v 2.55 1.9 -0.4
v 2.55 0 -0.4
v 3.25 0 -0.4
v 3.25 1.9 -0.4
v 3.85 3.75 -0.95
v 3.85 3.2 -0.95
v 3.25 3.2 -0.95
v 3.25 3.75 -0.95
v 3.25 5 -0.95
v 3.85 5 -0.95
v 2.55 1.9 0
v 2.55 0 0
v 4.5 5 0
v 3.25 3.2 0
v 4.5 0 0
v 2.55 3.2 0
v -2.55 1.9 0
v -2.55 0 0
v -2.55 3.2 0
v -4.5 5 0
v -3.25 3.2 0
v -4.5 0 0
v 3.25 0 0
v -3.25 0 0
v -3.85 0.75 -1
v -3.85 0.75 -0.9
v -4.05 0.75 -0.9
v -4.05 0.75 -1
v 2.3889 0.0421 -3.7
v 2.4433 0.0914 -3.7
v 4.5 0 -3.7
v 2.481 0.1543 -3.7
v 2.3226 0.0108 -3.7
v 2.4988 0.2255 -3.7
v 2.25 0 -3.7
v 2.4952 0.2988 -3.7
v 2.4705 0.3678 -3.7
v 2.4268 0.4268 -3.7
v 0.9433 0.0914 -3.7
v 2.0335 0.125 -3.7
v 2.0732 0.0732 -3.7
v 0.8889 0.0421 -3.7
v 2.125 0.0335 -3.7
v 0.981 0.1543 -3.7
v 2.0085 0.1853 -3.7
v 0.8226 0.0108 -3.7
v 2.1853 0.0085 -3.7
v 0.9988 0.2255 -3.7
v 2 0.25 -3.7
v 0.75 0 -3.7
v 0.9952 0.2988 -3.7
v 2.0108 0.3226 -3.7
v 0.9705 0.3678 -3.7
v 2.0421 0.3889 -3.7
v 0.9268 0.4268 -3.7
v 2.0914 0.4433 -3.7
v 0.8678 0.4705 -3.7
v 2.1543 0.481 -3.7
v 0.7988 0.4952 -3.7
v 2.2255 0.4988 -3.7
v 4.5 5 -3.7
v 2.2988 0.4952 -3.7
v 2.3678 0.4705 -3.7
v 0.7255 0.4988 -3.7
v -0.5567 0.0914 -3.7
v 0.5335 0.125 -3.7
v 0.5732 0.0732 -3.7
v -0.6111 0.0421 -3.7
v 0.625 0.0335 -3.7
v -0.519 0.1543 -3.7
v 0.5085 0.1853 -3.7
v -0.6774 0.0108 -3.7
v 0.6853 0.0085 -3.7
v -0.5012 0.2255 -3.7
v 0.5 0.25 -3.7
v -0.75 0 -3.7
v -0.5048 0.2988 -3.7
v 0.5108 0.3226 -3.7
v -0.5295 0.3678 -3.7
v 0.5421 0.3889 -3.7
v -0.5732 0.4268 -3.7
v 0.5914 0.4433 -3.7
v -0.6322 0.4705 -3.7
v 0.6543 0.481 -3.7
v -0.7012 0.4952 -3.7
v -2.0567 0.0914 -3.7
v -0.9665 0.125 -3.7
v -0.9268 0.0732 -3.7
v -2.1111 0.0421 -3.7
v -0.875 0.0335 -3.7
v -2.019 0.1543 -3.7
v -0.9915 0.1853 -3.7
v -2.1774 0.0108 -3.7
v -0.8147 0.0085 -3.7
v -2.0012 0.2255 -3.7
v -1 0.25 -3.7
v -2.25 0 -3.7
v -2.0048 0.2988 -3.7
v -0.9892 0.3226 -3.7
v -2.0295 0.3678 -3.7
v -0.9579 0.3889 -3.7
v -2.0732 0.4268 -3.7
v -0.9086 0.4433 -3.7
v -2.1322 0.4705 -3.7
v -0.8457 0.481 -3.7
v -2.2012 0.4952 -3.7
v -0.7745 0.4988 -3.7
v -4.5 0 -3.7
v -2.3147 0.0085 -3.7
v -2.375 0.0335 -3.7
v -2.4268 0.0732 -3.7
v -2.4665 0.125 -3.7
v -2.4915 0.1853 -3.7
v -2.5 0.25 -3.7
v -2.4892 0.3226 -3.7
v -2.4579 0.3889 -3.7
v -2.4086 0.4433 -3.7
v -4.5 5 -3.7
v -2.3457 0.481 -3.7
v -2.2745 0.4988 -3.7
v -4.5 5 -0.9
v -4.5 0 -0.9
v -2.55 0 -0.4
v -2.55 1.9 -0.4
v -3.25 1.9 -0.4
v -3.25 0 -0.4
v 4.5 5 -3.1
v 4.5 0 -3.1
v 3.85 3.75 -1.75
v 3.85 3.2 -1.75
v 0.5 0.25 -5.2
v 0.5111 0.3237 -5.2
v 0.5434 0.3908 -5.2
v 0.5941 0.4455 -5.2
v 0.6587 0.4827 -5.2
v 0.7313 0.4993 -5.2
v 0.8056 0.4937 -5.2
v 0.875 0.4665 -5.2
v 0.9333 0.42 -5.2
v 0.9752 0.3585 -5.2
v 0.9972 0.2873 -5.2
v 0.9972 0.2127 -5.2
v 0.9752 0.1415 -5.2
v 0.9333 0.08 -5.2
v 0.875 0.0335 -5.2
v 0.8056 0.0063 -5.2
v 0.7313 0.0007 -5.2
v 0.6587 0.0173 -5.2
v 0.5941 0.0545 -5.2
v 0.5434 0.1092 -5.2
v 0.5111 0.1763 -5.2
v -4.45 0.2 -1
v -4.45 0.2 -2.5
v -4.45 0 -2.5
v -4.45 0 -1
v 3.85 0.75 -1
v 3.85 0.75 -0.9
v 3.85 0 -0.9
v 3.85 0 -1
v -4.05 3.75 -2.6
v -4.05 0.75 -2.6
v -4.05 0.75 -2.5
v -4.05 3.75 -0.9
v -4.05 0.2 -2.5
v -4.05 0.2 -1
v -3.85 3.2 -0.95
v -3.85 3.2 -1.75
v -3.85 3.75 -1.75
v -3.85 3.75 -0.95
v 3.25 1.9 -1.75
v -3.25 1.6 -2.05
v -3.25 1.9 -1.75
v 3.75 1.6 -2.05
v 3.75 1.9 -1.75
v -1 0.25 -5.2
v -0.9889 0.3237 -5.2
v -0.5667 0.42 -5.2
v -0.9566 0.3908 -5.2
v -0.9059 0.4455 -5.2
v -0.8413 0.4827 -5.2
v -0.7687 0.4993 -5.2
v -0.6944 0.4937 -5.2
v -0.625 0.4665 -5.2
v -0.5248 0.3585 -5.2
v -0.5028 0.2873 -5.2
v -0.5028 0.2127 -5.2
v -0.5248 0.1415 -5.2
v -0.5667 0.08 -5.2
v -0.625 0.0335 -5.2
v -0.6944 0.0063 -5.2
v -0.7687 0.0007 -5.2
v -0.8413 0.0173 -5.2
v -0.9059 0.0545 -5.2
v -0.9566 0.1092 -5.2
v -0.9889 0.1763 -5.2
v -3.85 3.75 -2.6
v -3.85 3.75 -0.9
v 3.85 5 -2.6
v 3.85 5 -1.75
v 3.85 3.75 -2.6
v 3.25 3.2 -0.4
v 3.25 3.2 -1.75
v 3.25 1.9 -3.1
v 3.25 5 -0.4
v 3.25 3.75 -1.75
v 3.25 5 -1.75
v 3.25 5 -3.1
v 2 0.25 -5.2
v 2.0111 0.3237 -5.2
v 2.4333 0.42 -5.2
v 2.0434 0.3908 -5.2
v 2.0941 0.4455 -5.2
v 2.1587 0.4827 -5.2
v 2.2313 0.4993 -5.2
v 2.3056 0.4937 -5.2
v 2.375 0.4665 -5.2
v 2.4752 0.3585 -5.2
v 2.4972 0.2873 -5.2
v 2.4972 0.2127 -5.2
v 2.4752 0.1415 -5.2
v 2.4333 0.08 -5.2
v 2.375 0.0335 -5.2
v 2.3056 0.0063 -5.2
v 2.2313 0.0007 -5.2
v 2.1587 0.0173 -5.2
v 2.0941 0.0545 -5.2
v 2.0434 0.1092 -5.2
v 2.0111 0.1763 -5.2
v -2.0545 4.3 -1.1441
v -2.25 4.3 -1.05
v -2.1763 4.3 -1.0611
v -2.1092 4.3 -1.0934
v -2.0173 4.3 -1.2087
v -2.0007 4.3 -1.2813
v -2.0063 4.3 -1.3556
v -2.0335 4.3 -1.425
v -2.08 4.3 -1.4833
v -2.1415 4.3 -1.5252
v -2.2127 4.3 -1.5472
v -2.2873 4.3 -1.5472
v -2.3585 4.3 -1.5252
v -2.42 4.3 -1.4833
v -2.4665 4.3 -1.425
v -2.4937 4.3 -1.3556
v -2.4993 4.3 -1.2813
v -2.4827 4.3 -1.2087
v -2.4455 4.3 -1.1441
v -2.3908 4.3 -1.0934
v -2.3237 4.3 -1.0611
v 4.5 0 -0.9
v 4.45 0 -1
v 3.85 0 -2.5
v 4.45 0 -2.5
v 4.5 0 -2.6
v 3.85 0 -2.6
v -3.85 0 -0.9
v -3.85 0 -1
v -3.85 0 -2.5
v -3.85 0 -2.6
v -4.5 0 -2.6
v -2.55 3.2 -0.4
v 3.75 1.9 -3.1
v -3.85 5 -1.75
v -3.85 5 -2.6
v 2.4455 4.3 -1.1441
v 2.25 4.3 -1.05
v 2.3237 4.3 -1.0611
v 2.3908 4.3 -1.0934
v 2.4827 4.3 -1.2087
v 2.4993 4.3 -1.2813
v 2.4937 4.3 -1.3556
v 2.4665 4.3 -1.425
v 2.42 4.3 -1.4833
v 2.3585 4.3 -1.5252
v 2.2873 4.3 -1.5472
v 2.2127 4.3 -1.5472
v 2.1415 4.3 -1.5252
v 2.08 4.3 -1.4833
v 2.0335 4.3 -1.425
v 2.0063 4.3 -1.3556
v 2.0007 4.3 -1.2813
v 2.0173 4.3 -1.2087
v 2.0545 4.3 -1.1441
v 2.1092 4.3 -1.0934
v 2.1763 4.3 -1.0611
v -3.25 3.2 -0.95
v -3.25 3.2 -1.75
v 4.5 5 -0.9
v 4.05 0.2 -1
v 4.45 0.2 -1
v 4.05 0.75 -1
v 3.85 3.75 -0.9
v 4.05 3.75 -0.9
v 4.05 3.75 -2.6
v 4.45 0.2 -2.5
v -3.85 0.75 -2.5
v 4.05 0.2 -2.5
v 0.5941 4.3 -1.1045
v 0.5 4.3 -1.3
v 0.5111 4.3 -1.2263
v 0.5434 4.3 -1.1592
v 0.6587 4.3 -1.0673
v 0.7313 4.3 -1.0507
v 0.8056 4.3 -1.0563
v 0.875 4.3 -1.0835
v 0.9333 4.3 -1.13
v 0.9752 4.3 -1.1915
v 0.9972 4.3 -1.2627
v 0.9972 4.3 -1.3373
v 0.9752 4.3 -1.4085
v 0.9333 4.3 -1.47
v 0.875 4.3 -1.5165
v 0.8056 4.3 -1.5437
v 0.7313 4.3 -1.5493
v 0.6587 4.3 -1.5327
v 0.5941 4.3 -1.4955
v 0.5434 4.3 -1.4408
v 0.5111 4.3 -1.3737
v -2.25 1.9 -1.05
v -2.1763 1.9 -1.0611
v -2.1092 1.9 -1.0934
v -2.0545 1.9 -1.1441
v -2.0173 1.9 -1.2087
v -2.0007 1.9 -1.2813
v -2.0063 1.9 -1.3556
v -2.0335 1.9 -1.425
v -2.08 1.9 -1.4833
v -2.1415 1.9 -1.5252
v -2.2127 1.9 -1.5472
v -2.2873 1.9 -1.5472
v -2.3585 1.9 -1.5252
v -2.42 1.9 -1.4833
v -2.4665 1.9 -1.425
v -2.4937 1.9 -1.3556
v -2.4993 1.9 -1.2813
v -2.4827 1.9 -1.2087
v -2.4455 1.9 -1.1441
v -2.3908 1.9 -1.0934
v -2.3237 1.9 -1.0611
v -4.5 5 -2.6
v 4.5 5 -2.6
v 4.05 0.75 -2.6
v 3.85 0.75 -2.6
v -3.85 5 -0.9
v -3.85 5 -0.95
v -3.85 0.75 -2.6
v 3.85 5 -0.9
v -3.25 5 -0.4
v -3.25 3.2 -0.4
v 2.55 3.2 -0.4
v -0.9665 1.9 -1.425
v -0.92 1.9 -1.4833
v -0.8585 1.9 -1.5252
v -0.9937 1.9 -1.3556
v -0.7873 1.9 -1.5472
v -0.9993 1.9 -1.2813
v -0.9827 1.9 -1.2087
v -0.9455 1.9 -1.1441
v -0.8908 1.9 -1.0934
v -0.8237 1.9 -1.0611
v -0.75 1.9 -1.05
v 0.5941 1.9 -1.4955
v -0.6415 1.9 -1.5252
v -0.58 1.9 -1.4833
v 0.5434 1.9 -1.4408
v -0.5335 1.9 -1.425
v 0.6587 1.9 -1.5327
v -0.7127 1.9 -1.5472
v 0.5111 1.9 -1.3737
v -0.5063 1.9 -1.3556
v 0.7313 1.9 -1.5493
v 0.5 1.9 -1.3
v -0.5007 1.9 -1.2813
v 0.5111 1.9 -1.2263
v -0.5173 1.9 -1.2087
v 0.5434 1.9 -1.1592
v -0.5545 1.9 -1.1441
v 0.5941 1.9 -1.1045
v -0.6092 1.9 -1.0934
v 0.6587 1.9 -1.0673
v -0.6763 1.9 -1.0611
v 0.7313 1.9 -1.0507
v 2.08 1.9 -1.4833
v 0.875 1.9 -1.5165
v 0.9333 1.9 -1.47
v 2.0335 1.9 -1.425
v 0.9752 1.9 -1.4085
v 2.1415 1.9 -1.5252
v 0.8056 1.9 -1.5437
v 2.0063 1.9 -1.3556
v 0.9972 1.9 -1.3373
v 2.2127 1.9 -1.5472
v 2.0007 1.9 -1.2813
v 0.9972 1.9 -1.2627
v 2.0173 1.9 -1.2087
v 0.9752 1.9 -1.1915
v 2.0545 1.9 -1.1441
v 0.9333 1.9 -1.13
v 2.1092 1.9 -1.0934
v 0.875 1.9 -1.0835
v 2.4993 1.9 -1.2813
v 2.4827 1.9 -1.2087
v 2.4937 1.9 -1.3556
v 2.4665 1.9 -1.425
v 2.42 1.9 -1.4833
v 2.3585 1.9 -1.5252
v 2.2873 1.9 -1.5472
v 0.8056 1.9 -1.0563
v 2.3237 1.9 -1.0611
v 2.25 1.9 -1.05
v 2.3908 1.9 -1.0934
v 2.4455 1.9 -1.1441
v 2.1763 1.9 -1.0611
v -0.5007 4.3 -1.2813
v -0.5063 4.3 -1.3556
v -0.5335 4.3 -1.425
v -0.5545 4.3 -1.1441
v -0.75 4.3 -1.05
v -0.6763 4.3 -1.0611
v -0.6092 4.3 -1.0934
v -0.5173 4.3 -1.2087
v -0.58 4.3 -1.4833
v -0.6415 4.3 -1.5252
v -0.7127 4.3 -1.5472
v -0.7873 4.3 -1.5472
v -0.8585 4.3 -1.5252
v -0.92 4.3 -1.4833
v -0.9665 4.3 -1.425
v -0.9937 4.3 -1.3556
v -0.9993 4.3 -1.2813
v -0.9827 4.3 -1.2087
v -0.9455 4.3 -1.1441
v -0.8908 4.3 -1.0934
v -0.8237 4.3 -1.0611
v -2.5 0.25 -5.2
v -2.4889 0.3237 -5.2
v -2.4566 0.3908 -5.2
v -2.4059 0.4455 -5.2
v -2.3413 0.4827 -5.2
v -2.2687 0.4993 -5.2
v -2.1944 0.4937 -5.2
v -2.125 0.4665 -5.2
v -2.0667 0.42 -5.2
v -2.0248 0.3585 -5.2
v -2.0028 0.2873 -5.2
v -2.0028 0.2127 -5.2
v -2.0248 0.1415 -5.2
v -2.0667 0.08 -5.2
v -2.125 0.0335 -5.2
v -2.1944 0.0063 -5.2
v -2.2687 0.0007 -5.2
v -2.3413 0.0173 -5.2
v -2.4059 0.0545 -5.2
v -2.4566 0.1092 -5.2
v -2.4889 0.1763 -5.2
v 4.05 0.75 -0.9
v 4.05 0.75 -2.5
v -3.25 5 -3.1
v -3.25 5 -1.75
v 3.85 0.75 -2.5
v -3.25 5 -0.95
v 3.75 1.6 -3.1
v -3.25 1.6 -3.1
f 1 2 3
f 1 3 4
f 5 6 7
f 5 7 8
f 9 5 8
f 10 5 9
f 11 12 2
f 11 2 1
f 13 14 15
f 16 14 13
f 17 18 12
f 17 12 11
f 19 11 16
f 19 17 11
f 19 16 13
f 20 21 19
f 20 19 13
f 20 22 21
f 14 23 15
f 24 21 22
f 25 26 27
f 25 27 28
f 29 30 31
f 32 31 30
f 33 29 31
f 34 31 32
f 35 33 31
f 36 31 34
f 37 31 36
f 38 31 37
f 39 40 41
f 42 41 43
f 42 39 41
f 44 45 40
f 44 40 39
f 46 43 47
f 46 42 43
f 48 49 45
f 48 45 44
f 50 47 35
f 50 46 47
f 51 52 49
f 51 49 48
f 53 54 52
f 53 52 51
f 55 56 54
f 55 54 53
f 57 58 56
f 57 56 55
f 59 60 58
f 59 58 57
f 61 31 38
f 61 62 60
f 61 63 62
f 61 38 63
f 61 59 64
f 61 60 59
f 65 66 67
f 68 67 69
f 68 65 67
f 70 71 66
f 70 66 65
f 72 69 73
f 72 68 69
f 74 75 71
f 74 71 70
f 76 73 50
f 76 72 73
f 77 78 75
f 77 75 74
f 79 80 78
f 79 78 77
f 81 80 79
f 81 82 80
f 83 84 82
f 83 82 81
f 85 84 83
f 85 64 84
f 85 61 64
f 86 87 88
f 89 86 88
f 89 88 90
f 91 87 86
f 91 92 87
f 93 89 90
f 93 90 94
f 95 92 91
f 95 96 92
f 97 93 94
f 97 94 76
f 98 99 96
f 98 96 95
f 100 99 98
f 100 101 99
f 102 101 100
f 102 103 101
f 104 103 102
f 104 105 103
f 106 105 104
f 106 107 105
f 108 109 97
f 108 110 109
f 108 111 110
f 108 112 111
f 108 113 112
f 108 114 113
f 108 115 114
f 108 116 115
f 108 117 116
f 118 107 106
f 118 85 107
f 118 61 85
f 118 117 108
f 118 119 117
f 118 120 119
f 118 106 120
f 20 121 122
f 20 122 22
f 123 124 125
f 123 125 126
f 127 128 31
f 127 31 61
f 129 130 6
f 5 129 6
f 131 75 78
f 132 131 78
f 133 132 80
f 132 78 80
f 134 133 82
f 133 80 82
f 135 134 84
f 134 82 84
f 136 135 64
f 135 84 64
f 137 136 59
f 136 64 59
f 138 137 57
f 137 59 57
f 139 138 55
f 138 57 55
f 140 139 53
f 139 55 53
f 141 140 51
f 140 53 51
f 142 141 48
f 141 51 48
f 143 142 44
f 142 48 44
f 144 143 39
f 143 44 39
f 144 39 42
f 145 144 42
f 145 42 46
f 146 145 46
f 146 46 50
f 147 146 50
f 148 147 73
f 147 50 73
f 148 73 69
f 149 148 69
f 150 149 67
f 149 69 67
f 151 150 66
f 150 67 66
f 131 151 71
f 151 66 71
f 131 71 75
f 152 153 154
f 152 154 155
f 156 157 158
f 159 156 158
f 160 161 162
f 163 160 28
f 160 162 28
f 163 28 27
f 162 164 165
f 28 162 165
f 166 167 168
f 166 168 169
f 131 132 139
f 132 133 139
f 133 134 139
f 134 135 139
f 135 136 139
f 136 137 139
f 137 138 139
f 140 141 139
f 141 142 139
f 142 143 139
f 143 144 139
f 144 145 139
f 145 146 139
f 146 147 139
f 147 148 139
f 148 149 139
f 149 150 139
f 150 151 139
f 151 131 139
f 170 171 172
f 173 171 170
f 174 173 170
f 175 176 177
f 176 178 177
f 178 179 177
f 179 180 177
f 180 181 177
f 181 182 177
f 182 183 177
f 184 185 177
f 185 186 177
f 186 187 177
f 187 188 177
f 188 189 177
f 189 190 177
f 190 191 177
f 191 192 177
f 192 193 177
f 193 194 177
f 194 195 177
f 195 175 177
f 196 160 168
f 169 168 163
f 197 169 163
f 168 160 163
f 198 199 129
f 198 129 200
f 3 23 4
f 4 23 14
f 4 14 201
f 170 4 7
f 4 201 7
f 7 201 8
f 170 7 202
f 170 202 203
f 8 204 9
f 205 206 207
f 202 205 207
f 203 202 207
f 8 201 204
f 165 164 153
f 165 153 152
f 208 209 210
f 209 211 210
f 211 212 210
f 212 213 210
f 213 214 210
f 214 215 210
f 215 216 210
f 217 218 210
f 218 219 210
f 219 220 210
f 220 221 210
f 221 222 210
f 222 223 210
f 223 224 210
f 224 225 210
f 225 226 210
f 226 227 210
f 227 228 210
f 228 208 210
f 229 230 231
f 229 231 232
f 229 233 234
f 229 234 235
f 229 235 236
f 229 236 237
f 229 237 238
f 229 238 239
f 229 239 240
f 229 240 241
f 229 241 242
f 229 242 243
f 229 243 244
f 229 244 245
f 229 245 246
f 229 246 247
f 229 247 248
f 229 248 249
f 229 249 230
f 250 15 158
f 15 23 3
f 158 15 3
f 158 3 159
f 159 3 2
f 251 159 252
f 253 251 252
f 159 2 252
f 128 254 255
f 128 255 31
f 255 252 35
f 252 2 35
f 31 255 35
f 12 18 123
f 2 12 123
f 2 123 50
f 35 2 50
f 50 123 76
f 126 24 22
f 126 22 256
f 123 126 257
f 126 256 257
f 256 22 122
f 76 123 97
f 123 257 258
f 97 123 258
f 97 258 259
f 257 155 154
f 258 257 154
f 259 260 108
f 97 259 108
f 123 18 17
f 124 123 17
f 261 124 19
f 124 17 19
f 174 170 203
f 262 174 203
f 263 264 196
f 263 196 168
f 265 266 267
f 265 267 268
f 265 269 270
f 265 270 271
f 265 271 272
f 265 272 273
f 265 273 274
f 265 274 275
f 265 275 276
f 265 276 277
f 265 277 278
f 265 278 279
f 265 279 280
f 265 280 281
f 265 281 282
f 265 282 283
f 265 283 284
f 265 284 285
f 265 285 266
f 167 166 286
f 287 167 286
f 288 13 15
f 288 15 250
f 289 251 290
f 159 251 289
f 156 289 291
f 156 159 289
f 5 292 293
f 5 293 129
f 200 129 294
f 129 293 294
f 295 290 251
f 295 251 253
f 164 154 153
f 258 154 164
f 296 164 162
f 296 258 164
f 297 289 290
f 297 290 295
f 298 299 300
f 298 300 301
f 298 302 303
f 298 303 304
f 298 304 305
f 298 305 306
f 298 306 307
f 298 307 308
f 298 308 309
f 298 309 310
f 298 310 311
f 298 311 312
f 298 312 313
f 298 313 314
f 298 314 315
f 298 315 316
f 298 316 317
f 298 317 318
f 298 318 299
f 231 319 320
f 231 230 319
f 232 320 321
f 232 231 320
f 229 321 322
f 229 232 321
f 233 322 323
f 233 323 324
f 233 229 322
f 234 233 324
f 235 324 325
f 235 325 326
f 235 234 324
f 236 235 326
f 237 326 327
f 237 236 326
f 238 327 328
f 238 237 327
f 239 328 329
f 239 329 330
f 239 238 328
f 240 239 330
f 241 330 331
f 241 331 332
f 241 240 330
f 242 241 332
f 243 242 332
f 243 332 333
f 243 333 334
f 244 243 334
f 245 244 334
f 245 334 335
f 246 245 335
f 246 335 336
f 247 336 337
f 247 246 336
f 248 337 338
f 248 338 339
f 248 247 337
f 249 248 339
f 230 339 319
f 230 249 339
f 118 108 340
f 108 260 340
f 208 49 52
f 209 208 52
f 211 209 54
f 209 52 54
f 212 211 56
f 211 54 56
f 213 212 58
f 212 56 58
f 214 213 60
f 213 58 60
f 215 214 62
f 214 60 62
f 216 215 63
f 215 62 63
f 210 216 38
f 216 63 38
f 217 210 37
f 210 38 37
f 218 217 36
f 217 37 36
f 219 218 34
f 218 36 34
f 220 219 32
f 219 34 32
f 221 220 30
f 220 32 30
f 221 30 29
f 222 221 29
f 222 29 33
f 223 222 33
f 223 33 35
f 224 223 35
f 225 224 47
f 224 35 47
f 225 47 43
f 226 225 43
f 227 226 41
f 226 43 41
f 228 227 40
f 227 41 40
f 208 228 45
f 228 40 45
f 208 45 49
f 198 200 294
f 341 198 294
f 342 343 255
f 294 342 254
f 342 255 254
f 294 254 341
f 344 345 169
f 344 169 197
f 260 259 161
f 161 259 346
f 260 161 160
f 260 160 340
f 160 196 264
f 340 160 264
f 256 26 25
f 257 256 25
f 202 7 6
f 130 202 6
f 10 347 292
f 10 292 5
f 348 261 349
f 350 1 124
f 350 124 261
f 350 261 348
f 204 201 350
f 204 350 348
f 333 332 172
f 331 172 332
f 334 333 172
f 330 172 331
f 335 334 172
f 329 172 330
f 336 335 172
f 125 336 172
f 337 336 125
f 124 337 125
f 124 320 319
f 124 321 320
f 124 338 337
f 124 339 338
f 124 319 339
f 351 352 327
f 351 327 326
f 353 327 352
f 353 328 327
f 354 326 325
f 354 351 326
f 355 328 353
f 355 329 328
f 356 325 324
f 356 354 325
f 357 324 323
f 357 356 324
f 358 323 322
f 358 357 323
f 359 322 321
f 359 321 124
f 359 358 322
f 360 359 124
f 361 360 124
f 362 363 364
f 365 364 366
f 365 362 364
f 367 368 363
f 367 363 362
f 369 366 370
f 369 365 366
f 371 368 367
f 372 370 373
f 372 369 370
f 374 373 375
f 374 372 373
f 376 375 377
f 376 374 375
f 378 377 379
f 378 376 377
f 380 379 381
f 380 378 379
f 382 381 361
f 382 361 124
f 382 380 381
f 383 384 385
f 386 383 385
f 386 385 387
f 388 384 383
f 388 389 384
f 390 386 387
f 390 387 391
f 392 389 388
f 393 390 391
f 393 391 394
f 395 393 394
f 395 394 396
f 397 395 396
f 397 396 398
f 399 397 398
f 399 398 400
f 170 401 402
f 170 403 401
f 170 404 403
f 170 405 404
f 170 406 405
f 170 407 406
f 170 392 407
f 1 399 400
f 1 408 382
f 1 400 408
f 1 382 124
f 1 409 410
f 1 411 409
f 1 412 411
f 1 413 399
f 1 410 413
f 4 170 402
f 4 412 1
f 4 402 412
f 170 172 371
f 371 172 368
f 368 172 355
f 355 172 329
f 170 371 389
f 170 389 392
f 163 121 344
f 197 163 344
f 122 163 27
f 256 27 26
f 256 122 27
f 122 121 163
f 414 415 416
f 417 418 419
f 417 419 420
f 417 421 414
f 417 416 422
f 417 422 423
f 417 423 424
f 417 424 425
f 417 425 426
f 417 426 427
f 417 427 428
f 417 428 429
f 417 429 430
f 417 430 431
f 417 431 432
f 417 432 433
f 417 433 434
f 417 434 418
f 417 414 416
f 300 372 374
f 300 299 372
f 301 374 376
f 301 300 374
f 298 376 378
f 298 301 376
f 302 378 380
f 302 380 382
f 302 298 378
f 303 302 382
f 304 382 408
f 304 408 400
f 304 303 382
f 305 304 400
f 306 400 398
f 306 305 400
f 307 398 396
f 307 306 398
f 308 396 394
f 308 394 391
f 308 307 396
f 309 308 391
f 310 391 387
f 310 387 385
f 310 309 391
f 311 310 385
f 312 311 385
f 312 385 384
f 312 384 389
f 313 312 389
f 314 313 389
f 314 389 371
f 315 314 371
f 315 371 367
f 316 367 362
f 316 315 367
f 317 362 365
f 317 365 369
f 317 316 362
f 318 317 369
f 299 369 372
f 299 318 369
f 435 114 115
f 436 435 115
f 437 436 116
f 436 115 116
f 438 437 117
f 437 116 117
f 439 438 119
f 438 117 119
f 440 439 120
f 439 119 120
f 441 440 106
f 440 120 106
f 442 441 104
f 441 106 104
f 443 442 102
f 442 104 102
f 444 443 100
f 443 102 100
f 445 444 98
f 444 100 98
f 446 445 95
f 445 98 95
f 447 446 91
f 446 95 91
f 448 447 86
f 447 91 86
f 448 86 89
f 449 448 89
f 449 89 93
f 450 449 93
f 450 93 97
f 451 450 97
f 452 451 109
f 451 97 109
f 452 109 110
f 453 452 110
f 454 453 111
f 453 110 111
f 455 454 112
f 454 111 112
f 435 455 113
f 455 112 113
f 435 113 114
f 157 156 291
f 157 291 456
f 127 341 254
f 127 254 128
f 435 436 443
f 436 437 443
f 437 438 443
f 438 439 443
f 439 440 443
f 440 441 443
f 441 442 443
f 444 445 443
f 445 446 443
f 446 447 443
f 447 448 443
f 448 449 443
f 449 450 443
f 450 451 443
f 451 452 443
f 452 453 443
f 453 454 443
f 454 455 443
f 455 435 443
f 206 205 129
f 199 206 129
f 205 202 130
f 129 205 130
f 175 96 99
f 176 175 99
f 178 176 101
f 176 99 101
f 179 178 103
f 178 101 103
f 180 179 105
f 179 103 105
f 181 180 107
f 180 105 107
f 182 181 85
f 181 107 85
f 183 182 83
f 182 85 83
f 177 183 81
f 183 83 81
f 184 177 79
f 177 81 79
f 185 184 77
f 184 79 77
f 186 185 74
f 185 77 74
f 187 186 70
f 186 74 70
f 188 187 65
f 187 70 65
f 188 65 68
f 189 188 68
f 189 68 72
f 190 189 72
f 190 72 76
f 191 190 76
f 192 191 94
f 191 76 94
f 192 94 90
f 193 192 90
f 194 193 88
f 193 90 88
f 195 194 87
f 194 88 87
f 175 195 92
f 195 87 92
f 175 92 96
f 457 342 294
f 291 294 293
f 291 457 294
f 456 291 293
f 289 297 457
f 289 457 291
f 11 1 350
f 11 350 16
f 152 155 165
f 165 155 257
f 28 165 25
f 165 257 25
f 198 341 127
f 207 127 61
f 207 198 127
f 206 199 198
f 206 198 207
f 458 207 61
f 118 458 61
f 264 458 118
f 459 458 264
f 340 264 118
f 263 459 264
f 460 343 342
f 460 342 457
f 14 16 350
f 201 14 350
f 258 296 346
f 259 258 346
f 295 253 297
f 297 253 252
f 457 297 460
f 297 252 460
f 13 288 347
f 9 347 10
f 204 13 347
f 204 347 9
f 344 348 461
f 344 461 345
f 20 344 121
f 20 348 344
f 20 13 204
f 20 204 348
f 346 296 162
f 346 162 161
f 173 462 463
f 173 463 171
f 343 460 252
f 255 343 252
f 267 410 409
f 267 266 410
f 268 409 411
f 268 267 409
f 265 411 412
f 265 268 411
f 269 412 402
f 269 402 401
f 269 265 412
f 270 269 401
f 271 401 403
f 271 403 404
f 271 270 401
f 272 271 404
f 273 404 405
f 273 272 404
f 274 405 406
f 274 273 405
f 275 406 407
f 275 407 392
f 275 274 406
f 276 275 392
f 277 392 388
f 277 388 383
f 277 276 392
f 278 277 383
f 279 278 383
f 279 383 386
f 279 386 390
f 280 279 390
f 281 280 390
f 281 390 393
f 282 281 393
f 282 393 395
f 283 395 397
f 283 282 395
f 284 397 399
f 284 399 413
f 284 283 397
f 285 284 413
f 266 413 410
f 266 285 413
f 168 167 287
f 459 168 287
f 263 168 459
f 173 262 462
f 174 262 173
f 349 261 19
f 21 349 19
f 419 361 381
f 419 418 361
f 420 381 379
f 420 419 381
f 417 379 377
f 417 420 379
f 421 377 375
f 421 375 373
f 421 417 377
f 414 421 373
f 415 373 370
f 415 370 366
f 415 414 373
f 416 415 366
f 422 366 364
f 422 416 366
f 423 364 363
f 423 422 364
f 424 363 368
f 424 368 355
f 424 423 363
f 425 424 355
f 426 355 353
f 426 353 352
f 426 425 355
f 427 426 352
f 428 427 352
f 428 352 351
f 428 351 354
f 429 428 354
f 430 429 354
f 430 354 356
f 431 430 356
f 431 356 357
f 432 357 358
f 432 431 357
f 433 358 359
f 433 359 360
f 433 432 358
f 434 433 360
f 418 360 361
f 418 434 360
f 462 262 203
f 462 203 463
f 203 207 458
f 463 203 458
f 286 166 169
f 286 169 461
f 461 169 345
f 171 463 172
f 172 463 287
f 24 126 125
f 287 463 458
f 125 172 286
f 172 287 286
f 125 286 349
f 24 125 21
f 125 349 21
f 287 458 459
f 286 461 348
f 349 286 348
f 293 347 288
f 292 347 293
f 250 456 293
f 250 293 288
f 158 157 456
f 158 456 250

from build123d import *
from build123d.topology import SkipClean

# Parameters (mm, degrees)
BOSS_EXTRUDE1_START  = -2.55
BOSS_EXTRUDE1_DEPTH  = 5.1
SKETCH2_W            = 5.1
SKETCH2_H            = 1.9
BOSS_EXTRUDE2_DEPTH  = 1.75
SKETCH3_W            = 5.100000167
SKETCH3_H            = 0.4
BOSS_EXTRUDE3_DEPTH  = 3.1
SKETCH4_W            = 5.1
SKETCH4_H            = 1.6
BOSS_EXTRUDE4_DEPTH  = 1.05
BOSS_EXTRUDE5_DEPTH  = 0.700000167
SKETCH6_W            = 0.4
SKETCH6_H            = 1.8
BOSS_EXTRUDE6_DEPTH  = 0.7
SKETCH7_W            = 0.4
SKETCH7_H            = 1.8
BOSS_EXTRUDE7_DEPTH  = 0.7
BOSS_EXTRUDE8_DEPTH  = 0.7
SKETCH9_W            = 3.1
SKETCH9_H            = 5
BOSS_EXTRUDE9_DEPTH  = 1.25
SKETCH10_W           = 3.1
SKETCH10_H           = 5
BOSS_EXTRUDE10_DEPTH = 1.25
SKETCH11_W           = 9
SKETCH11_H           = 5
BOSS_EXTRUDE11_DEPTH = 0.6
CUT_EXTRUDE1_DEPTH   = 0.5
SKETCH13_W           = 0.45
SKETCH13_H           = 1.7
CUT_EXTRUDE2_DEPTH   = 8.677239185
CUT_EXTRUDE3_REACH   = 12.573
SKETCH14_W           = 0.8
SKETCH14_H           = 1.25
SKETCH15_W           = 0.85
SKETCH15_H           = 1.25
CUT_EXTRUDE4_DEPTH   = 0.2
SKETCH16_W           = 0.05
SKETCH16_H           = 1.25
CUT_EXTRUDE5_DEPTH   = 0.2
CUT_EXTRUDE6_REACH   = 8.647
SKETCH18_W           = 0.6
SKETCH18_H           = 0.8
SKETCH19_W           = 0.45
SKETCH19_H           = 1.7
CUT_EXTRUDE7_DEPTH   = 8.677239185
SKETCH20_W           = 0.8
SKETCH20_H           = 1.25
CUT_EXTRUDE8_DEPTH   = 11.573197246
SKETCH21_W           = 0.85
SKETCH21_H           = 1.25
CUT_EXTRUDE9_DEPTH   = 0.2
CUT_EXTRUDE10_REACH  = 12.412
SKETCH23_W           = 0.1
SKETCH23_H           = 0.75
SKETCH24_W           = 1.5
SKETCH24_H           = 0.2
BOSS_EXTRUDE12_DEPTH = 0.4
CUT_EXTRUDE11_REACH  = 12.412
SKETCH26_W           = 0.1
SKETCH26_H           = 0.75
CUT_EXTRUDE12_REACH  = 12.412
SKETCH28_W           = 0.75
SKETCH28_H           = 0.1
SKETCH29_W           = 1.5
SKETCH29_H           = 0.2
BOSS_EXTRUDE13_DEPTH = 0.4
CUT_EXTRUDE13_REACH  = 12.412
SKETCH31_W           = 0.75
SKETCH31_H           = 0.1
SKETCH32_W           = 0.05
SKETCH32_H           = 1.25
CUT_EXTRUDE14_DEPTH  = 0.2
CUT_EXTRUDE15_REACH  = 8.647
SKETCH34_W           = 0.6
SKETCH34_H           = 0.8
SKETCH35_W           = 0.25
SKETCH35_H           = 2.4
SKETCH36_W           = 0.25
SKETCH36_H           = 2.4
SKETCH37_W           = 0.25
SKETCH37_H           = 2.4
SKETCH38_W           = 0.25
SKETCH38_H           = 2.4
SKETCH39_W           = 0.25
SKETCH39_H           = 1.5
SKETCH40_W           = 0.25
SKETCH40_H           = 1.5
SKETCH41_W           = 0.25
SKETCH41_H           = 1.5
SKETCH42_W           = 0.25
SKETCH42_H           = 1.5


with BuildPart() as part:
    # Boss-Extrude1: read off the stored shape, not the designer's step
    # Boss-Extrude1 outline → Boss-Extrude1 (new body)
    with BuildSketch(Plane.YZ.offset(BOSS_EXTRUDE1_START)):
        Polygon((0, -2.05), (1.6, -2.05), (1.9, -1.75), (0, -1.75), align=None)
    extrude(amount=BOSS_EXTRUDE1_DEPTH)

    # Sketch2 → Boss-Extrude2 (add)
    with BuildSketch(Plane.XY.offset(-1.75)):
        with Locations((0, 0.95)):
            Rectangle(SKETCH2_W, SKETCH2_H)
    extrude(amount=BOSS_EXTRUDE2_DEPTH)

    # Sketch3 → Boss-Extrude3 (add)
    with BuildSketch(Plane(origin=(0, 1.9, 0), x_dir=(-1, 0, 0), z_dir=(0, 1, 0))):
        with Locations((-8.4e-08, -0.2)):
            Rectangle(SKETCH3_W, SKETCH3_H)
    extrude(amount=BOSS_EXTRUDE3_DEPTH)

    # Sketch4 → Boss-Extrude4 (add)
    with BuildSketch(Plane(origin=(0, 0, -2.05), x_dir=(-1, 0, 0), z_dir=(0, 0, -1))):
        with Locations((0, 0.8)):
            Rectangle(SKETCH4_W, SKETCH4_H)
    extrude(amount=BOSS_EXTRUDE4_DEPTH)

    # Sketch5 → Boss-Extrude5 (add)
    with BuildSketch(Plane(origin=(2.55, 0, 0), x_dir=(0, 0, -1), z_dir=(1, 0, 0))):
        Polygon((3.1, 0), (0.4, 0), (0.4, 1.9), (1.75, 1.9), (2.05, 1.6), (3.1, 1.6), align=None)
    extrude(amount=BOSS_EXTRUDE5_DEPTH)

    # Sketch6 → Boss-Extrude6 (add)
    with BuildSketch(Plane(origin=(2.55, 0, 0), x_dir=(0, 0, -1), z_dir=(1, 0, 0))):
        with Locations((0.2, 4.1)):
            Rectangle(SKETCH6_W, SKETCH6_H)
    extrude(amount=BOSS_EXTRUDE6_DEPTH)

    # Sketch7 → Boss-Extrude7 (add)
    with BuildSketch(Plane.ZY.offset(2.55)):
        with Locations((-0.2, 4.1)):
            Rectangle(SKETCH7_W, SKETCH7_H)
    extrude(amount=BOSS_EXTRUDE7_DEPTH)

    # Sketch8 → Boss-Extrude8 (add)
    with BuildSketch(Plane.ZY.offset(2.55)):
        Polygon((-0.4, 1.9), (-0.4, 0), (-3.1, 0), (-3.1, 1.6), (-2.05, 1.6), (-1.75, 1.9), align=None)
    extrude(amount=BOSS_EXTRUDE8_DEPTH)

    # Sketch9 → Boss-Extrude9 (add)
    with BuildSketch(Plane.ZY.offset(3.25)):
        with Locations((-1.55, 2.5)):
            Rectangle(SKETCH9_W, SKETCH9_H)
    extrude(amount=BOSS_EXTRUDE9_DEPTH)

    # Sketch10 → Boss-Extrude10 (add)
    with BuildSketch(Plane(origin=(3.250000167, 0, 0), x_dir=(0, 0, -1), z_dir=(1, 0, 0))):
        with Locations((1.55, 2.5)):
            Rectangle(SKETCH10_W, SKETCH10_H)
    extrude(amount=BOSS_EXTRUDE10_DEPTH)

    # Sketch11 → Boss-Extrude11 (add)
    with SkipClean():  # the faces are left unmerged after this step: merging them gives an invalid solid
        with BuildSketch(Plane(origin=(0, 0, -3.1), x_dir=(-1, 0, 0), z_dir=(0, 0, -1))):
            with Locations((0, 2.5)):
                Rectangle(SKETCH11_W, SKETCH11_H)
        extrude(amount=BOSS_EXTRUDE11_DEPTH)

    # Sketch12 → Cut-Extrude1 (cut)
    with SkipClean():  # the faces are left unmerged after this step: merging them gives an invalid solid
        with BuildSketch(Plane.ZY.offset(-3.250000167)):
            Polygon((-3.1, 1.6), (-2.05, 1.6), (-1.75, 1.9), (-3.1, 1.9), align=None)
        extrude(amount=-CUT_EXTRUDE1_DEPTH, mode=Mode.SUBTRACT)

    # Sketch13 → Cut-Extrude2 (cut, through all)
    with SkipClean():  # the faces are left unmerged after this step: merging them gives an invalid solid
        with BuildSketch(Plane.XZ):
            with Locations((-4.275, -1.75)):
                Rectangle(SKETCH13_W, SKETCH13_H)
        extrude(amount=-CUT_EXTRUDE2_DEPTH, mode=Mode.SUBTRACT)

    # Sketch14 → Cut-Extrude3 (cut, up to next)
    with BuildSketch(Plane.ZY.offset(4.05), mode=Mode.PRIVATE) as cut_extrude3_sk1:
        with Locations((-1.35, 4.375)):
            Rectangle(SKETCH14_W, SKETCH14_H)
    cut_extrude3_tool1 = extrude(cut_extrude3_sk1.sketch, amount=-CUT_EXTRUDE3_REACH, mode=Mode.PRIVATE) & part.part
    add(cut_extrude3_tool1.solids().sort_by_distance((-4.05, 4.375, -1.35))[0], mode=Mode.SUBTRACT)

    # Sketch15 → Cut-Extrude4 (cut)
    with SkipClean():  # the faces are left unmerged after this step: merging them gives an invalid solid
        with BuildSketch(Plane.ZY.offset(4.05)):
            with Locations((-2.175, 4.375)):
                Rectangle(SKETCH15_W, SKETCH15_H)
        extrude(amount=-CUT_EXTRUDE4_DEPTH, mode=Mode.SUBTRACT)

    # Sketch16 → Cut-Extrude5 (cut)
    with SkipClean():  # the faces are left unmerged after this step: merging them gives an invalid solid
        with BuildSketch(Plane.ZY.offset(4.05)):
            with Locations((-0.925, 4.375)):
                Rectangle(SKETCH16_W, SKETCH16_H)
        extrude(amount=-CUT_EXTRUDE5_DEPTH, mode=Mode.SUBTRACT)

    # Sketch18 → Cut-Extrude6 (cut, up to next)
    with BuildSketch(Plane.XZ.offset(-3.2), mode=Mode.PRIVATE) as cut_extrude6_sk1:
        with Locations((-3.55, -1.35)):
            Rectangle(SKETCH18_W, SKETCH18_H)
    cut_extrude6_tool1 = extrude(cut_extrude6_sk1.sketch, amount=-CUT_EXTRUDE6_REACH, mode=Mode.PRIVATE) & part.part
    add(cut_extrude6_tool1.solids().sort_by_distance((-3.55, 3.2, -1.35))[0], mode=Mode.SUBTRACT)

    # Sketch19 → Cut-Extrude7 (cut, through all)
    with SkipClean():  # the faces are left unmerged after this step: merging them gives an invalid solid
        with BuildSketch(Plane.XZ):
            with Locations((4.275, -1.75)):
                Rectangle(SKETCH19_W, SKETCH19_H)
        extrude(amount=-CUT_EXTRUDE7_DEPTH, mode=Mode.SUBTRACT)

    # Sketch20 → Cut-Extrude8 (cut, through all)
    with SkipClean():  # the faces are left unmerged after this step: merging them gives an invalid solid
        with BuildSketch(Plane(origin=(4.05, 0, 0), x_dir=(0, 0, -1), z_dir=(1, 0, 0))):
            with Locations((1.35, 4.375)):
                Rectangle(SKETCH20_W, SKETCH20_H)
        extrude(amount=-CUT_EXTRUDE8_DEPTH, mode=Mode.SUBTRACT)

    # Sketch21 → Cut-Extrude9 (cut)
    with SkipClean():  # the faces are left unmerged after this step: merging them gives an invalid solid
        with BuildSketch(Plane(origin=(4.05, 0, 0), x_dir=(0, 0, -1), z_dir=(1, 0, 0))):
            with Locations((2.175, 4.375)):
                Rectangle(SKETCH21_W, SKETCH21_H)
        extrude(amount=-CUT_EXTRUDE9_DEPTH, mode=Mode.SUBTRACT)

    # Sketch23 → Cut-Extrude10 (cut, up to next)
    with BuildSketch(Plane(origin=(-3.85, 0, 0), x_dir=(0, 0, -1), z_dir=(1, 0, 0)), mode=Mode.PRIVATE) as cut_extrude10_sk1:
        with Locations((0.95, 0.375)):
            Rectangle(SKETCH23_W, SKETCH23_H)
    cut_extrude10_tool1 = extrude(cut_extrude10_sk1.sketch, amount=-CUT_EXTRUDE10_REACH, mode=Mode.PRIVATE) & part.part
    add(cut_extrude10_tool1.solids().sort_by_distance((-3.85, 0.375, -0.95))[0], mode=Mode.SUBTRACT)

    # Sketch24 → Boss-Extrude12 (add)
    with SkipClean():  # the faces are left unmerged after this step: merging them gives an invalid solid
        with BuildSketch(Plane.ZY.offset(4.05)):
            with Locations((-1.75, 0.1)):
                Rectangle(SKETCH24_W, SKETCH24_H)
        extrude(amount=BOSS_EXTRUDE12_DEPTH)

    # Sketch26 → Cut-Extrude11 (cut, up to next)
    with BuildSketch(Plane(origin=(-3.85, 0, 0), x_dir=(0, 0, -1), z_dir=(1, 0, 0)), mode=Mode.PRIVATE) as cut_extrude11_sk1:
        with Locations((2.55, 0.375)):
            Rectangle(SKETCH26_W, SKETCH26_H)
    cut_extrude11_tool1 = extrude(cut_extrude11_sk1.sketch, amount=-CUT_EXTRUDE11_REACH, mode=Mode.PRIVATE) & part.part
    add(cut_extrude11_tool1.solids().sort_by_distance((-3.85, 0.375, -2.55))[0], mode=Mode.SUBTRACT)

    # Sketch28 → Cut-Extrude12 (cut, up to next)
    with BuildSketch(Plane(origin=(3.85, 0, 0), x_dir=(0, -1, 0), z_dir=(-1, 0, 0)), mode=Mode.PRIVATE) as cut_extrude12_sk1:
        with Locations((-0.375, -2.55)):
            Rectangle(SKETCH28_W, SKETCH28_H)
    cut_extrude12_tool1 = extrude(cut_extrude12_sk1.sketch, amount=-CUT_EXTRUDE12_REACH, mode=Mode.PRIVATE) & part.part
    add(cut_extrude12_tool1.solids().sort_by_distance((3.85, 0.375, -2.55))[0], mode=Mode.SUBTRACT)

    # Sketch29 → Boss-Extrude13 (add)
    with SkipClean():  # the faces are left unmerged after this step: merging them gives an invalid solid
        with BuildSketch(Plane(origin=(4.05, 0, 0), x_dir=(0, 0, -1), z_dir=(1, 0, 0))):
            with Locations((1.75, 0.1)):
                Rectangle(SKETCH29_W, SKETCH29_H)
        extrude(amount=BOSS_EXTRUDE13_DEPTH)

    # Sketch31 → Cut-Extrude13 (cut, up to next)
    with BuildSketch(Plane(origin=(3.85, 0, 0), x_dir=(0, -1, 0), z_dir=(-1, 0, 0)), mode=Mode.PRIVATE) as cut_extrude13_sk1:
        with Locations((-0.375, -0.95)):
            Rectangle(SKETCH31_W, SKETCH31_H)
    cut_extrude13_tool1 = extrude(cut_extrude13_sk1.sketch, amount=-CUT_EXTRUDE13_REACH, mode=Mode.PRIVATE) & part.part
    add(cut_extrude13_tool1.solids().sort_by_distance((3.85, 0.375, -0.95))[0], mode=Mode.SUBTRACT)

    # Sketch32 → Cut-Extrude14 (cut)
    with SkipClean():  # the faces are left unmerged after this step: merging them gives an invalid solid
        with BuildSketch(Plane(origin=(4.05, 0, 0), x_dir=(0, 0, -1), z_dir=(1, 0, 0))):
            with Locations((0.925, 4.375)):
                Rectangle(SKETCH32_W, SKETCH32_H)
        extrude(amount=-CUT_EXTRUDE14_DEPTH, mode=Mode.SUBTRACT)

    # Sketch34 → Cut-Extrude15 (cut, up to next)
    with BuildSketch(Plane.XZ.offset(-3.2), mode=Mode.PRIVATE) as cut_extrude15_sk1:
        with Locations((3.55, -1.35)):
            Rectangle(SKETCH34_W, SKETCH34_H)
    cut_extrude15_tool1 = extrude(cut_extrude15_sk1.sketch, amount=-CUT_EXTRUDE15_REACH, mode=Mode.PRIVATE) & part.part
    add(cut_extrude15_tool1.solids().sort_by_distance((3.55, 3.2, -1.35))[0], mode=Mode.SUBTRACT)

    # Sketch35 → Revolve1 (revolve)
    with SkipClean():  # the faces are left unmerged after this step: merging them gives an invalid solid
        with BuildSketch(Plane(origin=(0, 0, -1.3), x_dir=(-1, 0, 0), z_dir=(0, 0, -1)), mode=Mode.PRIVATE) as revolve1_sk:
            with Locations((-2.375, 3.1)):
                Rectangle(SKETCH35_W, SKETCH35_H)
        revolve(revolve1_sk.sketch.rotate(Axis((2.25, 1.9, -1.3), (0, 1, 0)), 270), axis=Axis((2.25, 1.9, -1.3), (0, 1, 0)))

    # Sketch36 → Revolve2 (revolve)
    with SkipClean():  # the faces are left unmerged after this step: merging them gives an invalid solid
        with BuildSketch(Plane(origin=(0, 0, -1.3), x_dir=(-1, 0, 0), z_dir=(0, 0, -1)), mode=Mode.PRIVATE) as revolve2_sk:
            with Locations((-0.875, 3.1)):
                Rectangle(SKETCH36_W, SKETCH36_H)
        revolve(revolve2_sk.sketch.rotate(Axis((0.75, 1.9, -1.3), (0, 1, 0)), 180), axis=Axis((0.75, 1.9, -1.3), (0, 1, 0)))

    # Sketch37 → Revolve3 (revolve)
    with SkipClean():  # the faces are left unmerged after this step: merging them gives an invalid solid
        with BuildSketch(Plane(origin=(0, 0, -1.3), x_dir=(-1, 0, 0), z_dir=(0, 0, -1)), mode=Mode.PRIVATE) as revolve3_sk:
            with Locations((0.625, 3.1)):
                Rectangle(SKETCH37_W, SKETCH37_H)
        revolve(revolve3_sk.sketch.rotate(Axis((-0.75, 1.9, -1.3), (0, 1, 0)), 270), axis=Axis((-0.75, 1.9, -1.3), (0, 1, 0)))

    # Sketch38 → Revolve4 (revolve)
    with SkipClean():  # the faces are left unmerged after this step: merging them gives an invalid solid
        with BuildSketch(Plane(origin=(0, 0, -1.3), x_dir=(-1, 0, 0), z_dir=(0, 0, -1)), mode=Mode.PRIVATE) as revolve4_sk:
            with Locations((2.125, 3.1)):
                Rectangle(SKETCH38_W, SKETCH38_H)
        revolve(revolve4_sk.sketch.rotate(Axis((-2.25, 1.9, -1.3), (0, 1, 0)), 270), axis=Axis((-2.25, 1.9, -1.3), (0, 1, 0)))

    # Sketch39 → Revolve5 (revolve)
    with SkipClean():  # the faces are left unmerged after this step: merging them gives an invalid solid
        with BuildSketch(Plane.XZ.offset(-0.25), mode=Mode.PRIVATE) as revolve5_sk:
            with Locations((2.375, -4.45)):
                Rectangle(SKETCH39_W, SKETCH39_H)
        revolve(revolve5_sk.sketch.rotate(Axis((2.25, 0.25, -3.7), (0, 0, -1)), 180), axis=Axis((2.25, 0.25, -3.7), (0, 0, -1)))

    # Sketch40 → Revolve6 (revolve)
    with SkipClean():  # the faces are left unmerged after this step: merging them gives an invalid solid
        with BuildSketch(Plane.XZ.offset(-0.25), mode=Mode.PRIVATE) as revolve6_sk:
            with Locations((0.875, -4.45)):
                Rectangle(SKETCH40_W, SKETCH40_H)
        revolve(revolve6_sk.sketch.rotate(Axis((0.75, 0.25, -3.7), (0, 0, -1)), 180), axis=Axis((0.75, 0.25, -3.7), (0, 0, -1)))

    # Sketch41 → Revolve7 (revolve)
    with SkipClean():  # the faces are left unmerged after this step: merging them gives an invalid solid
        with BuildSketch(Plane.XZ.offset(-0.25), mode=Mode.PRIVATE) as revolve7_sk:
            with Locations((-0.625, -4.45)):
                Rectangle(SKETCH41_W, SKETCH41_H)
        revolve(revolve7_sk.sketch.rotate(Axis((-0.75, 0.25, -3.7), (0, 0, -1)), 180), axis=Axis((-0.75, 0.25, -3.7), (0, 0, -1)))

    # Sketch42 → Revolve8 (revolve)
    with SkipClean():  # the faces are left unmerged after this step: merging them gives an invalid solid
        with BuildSketch(Plane.XZ.offset(-0.25), mode=Mode.PRIVATE) as revolve8_sk:
            with Locations((-2.125, -4.45)):
                Rectangle(SKETCH42_W, SKETCH42_H)
        revolve(revolve8_sk.sketch.rotate(Axis((-2.25, 0.25, -3.7), (0, 0, -1)), 180), axis=Axis((-2.25, 0.25, -3.7), (0, 0, -1)))


solid = part.part
